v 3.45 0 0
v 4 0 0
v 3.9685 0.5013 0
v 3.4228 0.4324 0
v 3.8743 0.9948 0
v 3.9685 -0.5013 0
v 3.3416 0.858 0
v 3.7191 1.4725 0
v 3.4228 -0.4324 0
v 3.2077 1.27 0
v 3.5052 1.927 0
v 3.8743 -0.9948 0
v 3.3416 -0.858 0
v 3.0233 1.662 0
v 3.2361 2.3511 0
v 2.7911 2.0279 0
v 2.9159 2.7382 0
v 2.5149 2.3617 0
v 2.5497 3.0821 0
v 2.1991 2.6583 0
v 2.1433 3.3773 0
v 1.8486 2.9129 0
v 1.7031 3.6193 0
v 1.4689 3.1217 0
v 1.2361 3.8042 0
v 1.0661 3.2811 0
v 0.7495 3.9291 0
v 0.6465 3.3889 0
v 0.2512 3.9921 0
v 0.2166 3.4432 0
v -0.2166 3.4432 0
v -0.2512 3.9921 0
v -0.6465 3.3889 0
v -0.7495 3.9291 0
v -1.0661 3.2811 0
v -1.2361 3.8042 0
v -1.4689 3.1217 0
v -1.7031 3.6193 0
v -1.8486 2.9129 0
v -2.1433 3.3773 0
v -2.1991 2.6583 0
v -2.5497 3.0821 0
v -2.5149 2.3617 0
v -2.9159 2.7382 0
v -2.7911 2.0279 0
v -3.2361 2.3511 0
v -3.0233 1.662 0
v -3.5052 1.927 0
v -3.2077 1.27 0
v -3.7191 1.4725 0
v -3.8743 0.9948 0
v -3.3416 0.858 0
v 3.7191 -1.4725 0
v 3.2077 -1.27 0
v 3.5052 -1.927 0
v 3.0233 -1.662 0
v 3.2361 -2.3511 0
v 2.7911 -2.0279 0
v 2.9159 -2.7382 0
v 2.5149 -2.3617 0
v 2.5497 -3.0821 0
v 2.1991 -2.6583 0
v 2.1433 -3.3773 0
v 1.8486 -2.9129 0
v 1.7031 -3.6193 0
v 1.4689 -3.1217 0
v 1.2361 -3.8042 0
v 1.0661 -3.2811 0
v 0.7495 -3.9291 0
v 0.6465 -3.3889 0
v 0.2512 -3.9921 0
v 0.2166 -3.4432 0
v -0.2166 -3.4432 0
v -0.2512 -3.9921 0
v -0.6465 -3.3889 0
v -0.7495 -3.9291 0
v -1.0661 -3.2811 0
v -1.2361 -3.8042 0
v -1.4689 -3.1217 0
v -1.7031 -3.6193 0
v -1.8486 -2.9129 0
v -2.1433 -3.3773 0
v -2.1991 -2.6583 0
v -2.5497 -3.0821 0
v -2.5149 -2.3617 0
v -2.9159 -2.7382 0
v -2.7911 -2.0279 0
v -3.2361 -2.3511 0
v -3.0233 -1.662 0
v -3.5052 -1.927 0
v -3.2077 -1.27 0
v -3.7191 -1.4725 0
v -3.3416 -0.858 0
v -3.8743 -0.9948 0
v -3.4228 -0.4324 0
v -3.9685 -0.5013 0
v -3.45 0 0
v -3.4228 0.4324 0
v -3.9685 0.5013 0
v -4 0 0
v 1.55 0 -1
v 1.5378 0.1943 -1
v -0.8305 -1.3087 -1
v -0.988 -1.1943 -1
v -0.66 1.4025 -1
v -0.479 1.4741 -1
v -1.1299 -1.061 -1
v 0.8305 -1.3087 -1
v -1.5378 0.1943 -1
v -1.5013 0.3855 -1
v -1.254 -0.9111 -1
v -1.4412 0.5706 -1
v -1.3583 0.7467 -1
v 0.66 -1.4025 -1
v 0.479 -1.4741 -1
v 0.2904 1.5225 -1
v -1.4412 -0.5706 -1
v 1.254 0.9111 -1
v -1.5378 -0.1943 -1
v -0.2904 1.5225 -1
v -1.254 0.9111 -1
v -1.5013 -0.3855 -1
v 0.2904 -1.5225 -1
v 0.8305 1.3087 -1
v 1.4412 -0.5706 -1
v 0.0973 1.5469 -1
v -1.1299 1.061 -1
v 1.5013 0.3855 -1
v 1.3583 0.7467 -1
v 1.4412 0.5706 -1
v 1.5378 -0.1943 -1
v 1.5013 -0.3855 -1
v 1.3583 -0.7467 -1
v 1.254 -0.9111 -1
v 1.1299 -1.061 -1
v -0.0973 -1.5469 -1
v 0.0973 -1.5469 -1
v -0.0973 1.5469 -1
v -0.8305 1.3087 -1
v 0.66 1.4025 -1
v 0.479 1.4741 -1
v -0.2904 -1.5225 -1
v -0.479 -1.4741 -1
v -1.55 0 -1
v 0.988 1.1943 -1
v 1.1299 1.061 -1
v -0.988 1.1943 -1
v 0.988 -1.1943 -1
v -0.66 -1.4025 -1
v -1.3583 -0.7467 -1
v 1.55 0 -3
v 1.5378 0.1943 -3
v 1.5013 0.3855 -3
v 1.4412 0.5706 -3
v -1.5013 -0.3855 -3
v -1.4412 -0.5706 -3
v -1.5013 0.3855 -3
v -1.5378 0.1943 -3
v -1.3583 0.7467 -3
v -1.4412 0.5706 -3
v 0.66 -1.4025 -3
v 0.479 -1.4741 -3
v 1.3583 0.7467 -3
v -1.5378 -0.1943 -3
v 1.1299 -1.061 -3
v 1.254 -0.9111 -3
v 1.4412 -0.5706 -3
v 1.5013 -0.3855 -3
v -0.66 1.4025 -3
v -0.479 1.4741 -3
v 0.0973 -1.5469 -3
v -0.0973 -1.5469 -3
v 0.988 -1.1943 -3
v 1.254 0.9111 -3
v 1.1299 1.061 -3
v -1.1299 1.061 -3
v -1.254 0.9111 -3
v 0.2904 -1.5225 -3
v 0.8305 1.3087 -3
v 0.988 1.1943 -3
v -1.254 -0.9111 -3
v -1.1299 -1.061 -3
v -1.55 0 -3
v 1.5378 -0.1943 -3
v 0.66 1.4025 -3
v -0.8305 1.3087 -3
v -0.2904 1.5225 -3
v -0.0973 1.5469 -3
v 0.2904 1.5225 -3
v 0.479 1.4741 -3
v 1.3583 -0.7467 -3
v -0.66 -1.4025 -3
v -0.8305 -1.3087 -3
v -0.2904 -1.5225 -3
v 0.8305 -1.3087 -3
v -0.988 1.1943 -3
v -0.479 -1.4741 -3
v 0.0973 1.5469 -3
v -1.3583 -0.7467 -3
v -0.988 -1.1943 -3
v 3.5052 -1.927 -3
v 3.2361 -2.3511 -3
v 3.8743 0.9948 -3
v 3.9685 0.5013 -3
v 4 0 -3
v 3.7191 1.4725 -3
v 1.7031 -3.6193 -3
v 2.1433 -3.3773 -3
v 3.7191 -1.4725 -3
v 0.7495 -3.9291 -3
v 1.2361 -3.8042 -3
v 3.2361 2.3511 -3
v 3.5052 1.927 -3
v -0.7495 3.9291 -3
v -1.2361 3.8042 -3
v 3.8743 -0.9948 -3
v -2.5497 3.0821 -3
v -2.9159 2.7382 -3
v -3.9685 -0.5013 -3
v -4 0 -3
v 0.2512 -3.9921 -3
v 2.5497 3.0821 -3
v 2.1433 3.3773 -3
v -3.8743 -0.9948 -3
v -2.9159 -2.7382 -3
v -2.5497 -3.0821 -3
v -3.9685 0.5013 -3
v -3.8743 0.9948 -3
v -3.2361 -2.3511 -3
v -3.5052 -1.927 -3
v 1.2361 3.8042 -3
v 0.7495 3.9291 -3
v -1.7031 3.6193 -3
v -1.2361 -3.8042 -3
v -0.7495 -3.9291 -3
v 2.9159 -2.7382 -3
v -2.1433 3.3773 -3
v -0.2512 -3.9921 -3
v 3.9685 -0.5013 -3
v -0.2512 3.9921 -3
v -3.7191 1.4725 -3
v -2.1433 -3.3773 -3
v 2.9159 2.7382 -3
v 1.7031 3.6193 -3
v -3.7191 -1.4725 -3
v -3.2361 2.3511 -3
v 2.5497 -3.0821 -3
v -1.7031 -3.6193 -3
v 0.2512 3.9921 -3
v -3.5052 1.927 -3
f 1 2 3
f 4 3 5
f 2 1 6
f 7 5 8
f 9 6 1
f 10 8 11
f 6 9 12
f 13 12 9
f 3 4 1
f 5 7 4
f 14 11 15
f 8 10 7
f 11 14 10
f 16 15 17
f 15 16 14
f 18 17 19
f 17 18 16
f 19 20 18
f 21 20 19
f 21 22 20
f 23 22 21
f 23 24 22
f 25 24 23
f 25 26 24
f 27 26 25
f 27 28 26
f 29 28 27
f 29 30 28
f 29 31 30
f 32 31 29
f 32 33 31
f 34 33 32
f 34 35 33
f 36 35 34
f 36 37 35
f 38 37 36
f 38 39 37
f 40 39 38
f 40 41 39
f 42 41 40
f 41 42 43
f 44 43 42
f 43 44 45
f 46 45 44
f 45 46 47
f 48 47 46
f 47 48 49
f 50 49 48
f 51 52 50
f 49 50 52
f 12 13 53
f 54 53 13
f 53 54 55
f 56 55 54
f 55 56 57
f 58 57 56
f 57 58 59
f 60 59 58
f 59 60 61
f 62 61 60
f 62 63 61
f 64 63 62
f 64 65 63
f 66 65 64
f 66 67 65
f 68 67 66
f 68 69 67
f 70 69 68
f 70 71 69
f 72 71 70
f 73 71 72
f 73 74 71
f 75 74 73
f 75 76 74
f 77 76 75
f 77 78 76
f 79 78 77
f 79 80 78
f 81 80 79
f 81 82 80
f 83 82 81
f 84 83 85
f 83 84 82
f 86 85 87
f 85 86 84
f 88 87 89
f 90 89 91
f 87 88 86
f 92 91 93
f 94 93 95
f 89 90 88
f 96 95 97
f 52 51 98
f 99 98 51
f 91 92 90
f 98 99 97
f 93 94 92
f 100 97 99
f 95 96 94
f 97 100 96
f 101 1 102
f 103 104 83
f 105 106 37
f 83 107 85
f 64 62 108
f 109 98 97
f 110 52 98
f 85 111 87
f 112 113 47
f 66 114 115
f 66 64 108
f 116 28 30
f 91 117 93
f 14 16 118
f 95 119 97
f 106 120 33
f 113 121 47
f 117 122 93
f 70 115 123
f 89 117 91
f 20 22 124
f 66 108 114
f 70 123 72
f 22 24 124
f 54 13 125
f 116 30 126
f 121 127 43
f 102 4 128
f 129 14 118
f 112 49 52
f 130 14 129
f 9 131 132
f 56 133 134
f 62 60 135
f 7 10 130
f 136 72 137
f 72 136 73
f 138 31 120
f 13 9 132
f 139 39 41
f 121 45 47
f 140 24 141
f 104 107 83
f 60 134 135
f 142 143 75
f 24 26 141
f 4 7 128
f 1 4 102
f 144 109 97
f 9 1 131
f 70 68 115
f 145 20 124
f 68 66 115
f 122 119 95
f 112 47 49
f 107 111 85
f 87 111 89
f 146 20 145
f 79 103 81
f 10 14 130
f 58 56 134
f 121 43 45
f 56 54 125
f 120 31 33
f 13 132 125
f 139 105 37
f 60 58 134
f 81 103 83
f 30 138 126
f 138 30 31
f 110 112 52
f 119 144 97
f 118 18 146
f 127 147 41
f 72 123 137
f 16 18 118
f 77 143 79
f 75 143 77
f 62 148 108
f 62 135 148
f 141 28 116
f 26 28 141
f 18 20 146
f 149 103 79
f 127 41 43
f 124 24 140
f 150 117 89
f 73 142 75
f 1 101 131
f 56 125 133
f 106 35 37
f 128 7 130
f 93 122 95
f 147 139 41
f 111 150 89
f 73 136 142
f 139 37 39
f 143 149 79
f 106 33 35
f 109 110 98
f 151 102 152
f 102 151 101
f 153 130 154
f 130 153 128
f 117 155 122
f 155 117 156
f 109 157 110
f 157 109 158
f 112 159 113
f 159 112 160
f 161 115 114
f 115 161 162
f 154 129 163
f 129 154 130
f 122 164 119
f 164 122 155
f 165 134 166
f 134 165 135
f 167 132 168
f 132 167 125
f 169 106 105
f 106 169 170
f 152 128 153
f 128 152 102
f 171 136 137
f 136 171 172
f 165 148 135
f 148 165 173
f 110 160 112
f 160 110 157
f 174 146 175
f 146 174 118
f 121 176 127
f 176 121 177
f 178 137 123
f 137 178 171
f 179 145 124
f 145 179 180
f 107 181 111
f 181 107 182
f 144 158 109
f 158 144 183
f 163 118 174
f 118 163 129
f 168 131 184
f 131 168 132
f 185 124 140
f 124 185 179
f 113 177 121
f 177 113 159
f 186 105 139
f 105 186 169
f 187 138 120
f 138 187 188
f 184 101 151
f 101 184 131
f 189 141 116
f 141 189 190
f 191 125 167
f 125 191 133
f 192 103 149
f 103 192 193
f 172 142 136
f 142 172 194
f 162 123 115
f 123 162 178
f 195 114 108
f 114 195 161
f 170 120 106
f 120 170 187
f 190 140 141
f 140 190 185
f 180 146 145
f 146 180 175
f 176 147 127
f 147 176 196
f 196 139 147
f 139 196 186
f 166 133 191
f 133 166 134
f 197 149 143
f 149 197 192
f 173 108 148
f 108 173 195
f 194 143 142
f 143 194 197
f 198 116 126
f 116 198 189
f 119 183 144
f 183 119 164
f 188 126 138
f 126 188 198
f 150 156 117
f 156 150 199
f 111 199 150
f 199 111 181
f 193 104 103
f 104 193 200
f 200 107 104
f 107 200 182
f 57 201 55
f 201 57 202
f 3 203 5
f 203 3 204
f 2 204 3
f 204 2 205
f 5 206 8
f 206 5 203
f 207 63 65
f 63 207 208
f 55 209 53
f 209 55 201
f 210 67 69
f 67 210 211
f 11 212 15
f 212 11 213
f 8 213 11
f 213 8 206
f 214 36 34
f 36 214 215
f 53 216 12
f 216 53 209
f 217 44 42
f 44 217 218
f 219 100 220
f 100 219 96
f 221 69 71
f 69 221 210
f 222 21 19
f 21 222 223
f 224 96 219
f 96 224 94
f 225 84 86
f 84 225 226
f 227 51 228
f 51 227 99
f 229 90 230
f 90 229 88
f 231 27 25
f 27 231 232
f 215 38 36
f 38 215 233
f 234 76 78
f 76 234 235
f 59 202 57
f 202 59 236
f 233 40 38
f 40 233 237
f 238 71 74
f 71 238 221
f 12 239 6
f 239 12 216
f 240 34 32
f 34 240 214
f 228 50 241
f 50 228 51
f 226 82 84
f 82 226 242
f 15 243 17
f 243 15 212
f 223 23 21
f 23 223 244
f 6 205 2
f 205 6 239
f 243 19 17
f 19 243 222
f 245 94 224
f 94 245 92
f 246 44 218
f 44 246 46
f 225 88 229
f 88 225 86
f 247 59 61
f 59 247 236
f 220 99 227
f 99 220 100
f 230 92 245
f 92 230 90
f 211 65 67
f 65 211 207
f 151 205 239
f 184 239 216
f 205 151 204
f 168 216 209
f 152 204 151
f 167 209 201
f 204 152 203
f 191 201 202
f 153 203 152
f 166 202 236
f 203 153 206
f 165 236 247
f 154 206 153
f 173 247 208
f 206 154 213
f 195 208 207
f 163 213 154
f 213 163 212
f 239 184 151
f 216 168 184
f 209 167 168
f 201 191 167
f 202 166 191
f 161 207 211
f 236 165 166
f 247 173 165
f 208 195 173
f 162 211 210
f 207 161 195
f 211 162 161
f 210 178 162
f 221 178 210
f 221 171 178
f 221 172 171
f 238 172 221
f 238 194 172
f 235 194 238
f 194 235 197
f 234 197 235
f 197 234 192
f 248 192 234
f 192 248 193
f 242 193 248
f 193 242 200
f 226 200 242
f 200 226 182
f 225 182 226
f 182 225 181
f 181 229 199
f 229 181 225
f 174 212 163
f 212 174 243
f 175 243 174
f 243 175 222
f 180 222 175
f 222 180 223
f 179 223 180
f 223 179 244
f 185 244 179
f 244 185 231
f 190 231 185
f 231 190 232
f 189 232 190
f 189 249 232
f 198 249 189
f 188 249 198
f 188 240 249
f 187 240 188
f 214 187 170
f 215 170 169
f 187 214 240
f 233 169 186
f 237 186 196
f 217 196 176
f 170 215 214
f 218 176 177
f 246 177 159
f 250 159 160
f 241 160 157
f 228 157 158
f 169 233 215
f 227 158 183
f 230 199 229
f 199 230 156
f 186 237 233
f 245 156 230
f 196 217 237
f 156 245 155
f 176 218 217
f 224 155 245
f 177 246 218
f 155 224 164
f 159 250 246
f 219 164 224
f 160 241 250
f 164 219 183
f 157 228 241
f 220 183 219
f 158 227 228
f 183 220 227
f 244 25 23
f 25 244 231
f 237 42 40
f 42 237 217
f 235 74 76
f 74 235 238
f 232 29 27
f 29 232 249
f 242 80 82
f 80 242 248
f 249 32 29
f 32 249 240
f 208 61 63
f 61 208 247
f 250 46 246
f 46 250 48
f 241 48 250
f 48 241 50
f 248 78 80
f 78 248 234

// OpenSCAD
$fn = 50;

difference() {
	union() {
		translate(v = [0, 0, -3.0]) {
			cylinder(h = 6, r = 4.0);
		}
	}
	union() {
		translate(v = [0, 0, 0]) {
			rotate(a = [0, 0, 0]) {
				difference() {
					union() {
						translate(v = [0, 0, -6.0]) {
							cylinder(h = 6, r = 1.25);
						}
						translate(v = [0, 0, -1.0]) {
							cylinder(h = 1.0, r1 = 1.55, r2 = 3.45);
						}
						translate(v = [0, 0, -6.0]) {
							cylinder(h = 6, r = 1.55);
						}
						translate(v = [0, 0, -6.0]) {
							cylinder(h = 6, r = 1.25);
						}
					}
					union();
				}
			}
		}
		#cylinder(h = 3, r = 5.0);
	}
}
